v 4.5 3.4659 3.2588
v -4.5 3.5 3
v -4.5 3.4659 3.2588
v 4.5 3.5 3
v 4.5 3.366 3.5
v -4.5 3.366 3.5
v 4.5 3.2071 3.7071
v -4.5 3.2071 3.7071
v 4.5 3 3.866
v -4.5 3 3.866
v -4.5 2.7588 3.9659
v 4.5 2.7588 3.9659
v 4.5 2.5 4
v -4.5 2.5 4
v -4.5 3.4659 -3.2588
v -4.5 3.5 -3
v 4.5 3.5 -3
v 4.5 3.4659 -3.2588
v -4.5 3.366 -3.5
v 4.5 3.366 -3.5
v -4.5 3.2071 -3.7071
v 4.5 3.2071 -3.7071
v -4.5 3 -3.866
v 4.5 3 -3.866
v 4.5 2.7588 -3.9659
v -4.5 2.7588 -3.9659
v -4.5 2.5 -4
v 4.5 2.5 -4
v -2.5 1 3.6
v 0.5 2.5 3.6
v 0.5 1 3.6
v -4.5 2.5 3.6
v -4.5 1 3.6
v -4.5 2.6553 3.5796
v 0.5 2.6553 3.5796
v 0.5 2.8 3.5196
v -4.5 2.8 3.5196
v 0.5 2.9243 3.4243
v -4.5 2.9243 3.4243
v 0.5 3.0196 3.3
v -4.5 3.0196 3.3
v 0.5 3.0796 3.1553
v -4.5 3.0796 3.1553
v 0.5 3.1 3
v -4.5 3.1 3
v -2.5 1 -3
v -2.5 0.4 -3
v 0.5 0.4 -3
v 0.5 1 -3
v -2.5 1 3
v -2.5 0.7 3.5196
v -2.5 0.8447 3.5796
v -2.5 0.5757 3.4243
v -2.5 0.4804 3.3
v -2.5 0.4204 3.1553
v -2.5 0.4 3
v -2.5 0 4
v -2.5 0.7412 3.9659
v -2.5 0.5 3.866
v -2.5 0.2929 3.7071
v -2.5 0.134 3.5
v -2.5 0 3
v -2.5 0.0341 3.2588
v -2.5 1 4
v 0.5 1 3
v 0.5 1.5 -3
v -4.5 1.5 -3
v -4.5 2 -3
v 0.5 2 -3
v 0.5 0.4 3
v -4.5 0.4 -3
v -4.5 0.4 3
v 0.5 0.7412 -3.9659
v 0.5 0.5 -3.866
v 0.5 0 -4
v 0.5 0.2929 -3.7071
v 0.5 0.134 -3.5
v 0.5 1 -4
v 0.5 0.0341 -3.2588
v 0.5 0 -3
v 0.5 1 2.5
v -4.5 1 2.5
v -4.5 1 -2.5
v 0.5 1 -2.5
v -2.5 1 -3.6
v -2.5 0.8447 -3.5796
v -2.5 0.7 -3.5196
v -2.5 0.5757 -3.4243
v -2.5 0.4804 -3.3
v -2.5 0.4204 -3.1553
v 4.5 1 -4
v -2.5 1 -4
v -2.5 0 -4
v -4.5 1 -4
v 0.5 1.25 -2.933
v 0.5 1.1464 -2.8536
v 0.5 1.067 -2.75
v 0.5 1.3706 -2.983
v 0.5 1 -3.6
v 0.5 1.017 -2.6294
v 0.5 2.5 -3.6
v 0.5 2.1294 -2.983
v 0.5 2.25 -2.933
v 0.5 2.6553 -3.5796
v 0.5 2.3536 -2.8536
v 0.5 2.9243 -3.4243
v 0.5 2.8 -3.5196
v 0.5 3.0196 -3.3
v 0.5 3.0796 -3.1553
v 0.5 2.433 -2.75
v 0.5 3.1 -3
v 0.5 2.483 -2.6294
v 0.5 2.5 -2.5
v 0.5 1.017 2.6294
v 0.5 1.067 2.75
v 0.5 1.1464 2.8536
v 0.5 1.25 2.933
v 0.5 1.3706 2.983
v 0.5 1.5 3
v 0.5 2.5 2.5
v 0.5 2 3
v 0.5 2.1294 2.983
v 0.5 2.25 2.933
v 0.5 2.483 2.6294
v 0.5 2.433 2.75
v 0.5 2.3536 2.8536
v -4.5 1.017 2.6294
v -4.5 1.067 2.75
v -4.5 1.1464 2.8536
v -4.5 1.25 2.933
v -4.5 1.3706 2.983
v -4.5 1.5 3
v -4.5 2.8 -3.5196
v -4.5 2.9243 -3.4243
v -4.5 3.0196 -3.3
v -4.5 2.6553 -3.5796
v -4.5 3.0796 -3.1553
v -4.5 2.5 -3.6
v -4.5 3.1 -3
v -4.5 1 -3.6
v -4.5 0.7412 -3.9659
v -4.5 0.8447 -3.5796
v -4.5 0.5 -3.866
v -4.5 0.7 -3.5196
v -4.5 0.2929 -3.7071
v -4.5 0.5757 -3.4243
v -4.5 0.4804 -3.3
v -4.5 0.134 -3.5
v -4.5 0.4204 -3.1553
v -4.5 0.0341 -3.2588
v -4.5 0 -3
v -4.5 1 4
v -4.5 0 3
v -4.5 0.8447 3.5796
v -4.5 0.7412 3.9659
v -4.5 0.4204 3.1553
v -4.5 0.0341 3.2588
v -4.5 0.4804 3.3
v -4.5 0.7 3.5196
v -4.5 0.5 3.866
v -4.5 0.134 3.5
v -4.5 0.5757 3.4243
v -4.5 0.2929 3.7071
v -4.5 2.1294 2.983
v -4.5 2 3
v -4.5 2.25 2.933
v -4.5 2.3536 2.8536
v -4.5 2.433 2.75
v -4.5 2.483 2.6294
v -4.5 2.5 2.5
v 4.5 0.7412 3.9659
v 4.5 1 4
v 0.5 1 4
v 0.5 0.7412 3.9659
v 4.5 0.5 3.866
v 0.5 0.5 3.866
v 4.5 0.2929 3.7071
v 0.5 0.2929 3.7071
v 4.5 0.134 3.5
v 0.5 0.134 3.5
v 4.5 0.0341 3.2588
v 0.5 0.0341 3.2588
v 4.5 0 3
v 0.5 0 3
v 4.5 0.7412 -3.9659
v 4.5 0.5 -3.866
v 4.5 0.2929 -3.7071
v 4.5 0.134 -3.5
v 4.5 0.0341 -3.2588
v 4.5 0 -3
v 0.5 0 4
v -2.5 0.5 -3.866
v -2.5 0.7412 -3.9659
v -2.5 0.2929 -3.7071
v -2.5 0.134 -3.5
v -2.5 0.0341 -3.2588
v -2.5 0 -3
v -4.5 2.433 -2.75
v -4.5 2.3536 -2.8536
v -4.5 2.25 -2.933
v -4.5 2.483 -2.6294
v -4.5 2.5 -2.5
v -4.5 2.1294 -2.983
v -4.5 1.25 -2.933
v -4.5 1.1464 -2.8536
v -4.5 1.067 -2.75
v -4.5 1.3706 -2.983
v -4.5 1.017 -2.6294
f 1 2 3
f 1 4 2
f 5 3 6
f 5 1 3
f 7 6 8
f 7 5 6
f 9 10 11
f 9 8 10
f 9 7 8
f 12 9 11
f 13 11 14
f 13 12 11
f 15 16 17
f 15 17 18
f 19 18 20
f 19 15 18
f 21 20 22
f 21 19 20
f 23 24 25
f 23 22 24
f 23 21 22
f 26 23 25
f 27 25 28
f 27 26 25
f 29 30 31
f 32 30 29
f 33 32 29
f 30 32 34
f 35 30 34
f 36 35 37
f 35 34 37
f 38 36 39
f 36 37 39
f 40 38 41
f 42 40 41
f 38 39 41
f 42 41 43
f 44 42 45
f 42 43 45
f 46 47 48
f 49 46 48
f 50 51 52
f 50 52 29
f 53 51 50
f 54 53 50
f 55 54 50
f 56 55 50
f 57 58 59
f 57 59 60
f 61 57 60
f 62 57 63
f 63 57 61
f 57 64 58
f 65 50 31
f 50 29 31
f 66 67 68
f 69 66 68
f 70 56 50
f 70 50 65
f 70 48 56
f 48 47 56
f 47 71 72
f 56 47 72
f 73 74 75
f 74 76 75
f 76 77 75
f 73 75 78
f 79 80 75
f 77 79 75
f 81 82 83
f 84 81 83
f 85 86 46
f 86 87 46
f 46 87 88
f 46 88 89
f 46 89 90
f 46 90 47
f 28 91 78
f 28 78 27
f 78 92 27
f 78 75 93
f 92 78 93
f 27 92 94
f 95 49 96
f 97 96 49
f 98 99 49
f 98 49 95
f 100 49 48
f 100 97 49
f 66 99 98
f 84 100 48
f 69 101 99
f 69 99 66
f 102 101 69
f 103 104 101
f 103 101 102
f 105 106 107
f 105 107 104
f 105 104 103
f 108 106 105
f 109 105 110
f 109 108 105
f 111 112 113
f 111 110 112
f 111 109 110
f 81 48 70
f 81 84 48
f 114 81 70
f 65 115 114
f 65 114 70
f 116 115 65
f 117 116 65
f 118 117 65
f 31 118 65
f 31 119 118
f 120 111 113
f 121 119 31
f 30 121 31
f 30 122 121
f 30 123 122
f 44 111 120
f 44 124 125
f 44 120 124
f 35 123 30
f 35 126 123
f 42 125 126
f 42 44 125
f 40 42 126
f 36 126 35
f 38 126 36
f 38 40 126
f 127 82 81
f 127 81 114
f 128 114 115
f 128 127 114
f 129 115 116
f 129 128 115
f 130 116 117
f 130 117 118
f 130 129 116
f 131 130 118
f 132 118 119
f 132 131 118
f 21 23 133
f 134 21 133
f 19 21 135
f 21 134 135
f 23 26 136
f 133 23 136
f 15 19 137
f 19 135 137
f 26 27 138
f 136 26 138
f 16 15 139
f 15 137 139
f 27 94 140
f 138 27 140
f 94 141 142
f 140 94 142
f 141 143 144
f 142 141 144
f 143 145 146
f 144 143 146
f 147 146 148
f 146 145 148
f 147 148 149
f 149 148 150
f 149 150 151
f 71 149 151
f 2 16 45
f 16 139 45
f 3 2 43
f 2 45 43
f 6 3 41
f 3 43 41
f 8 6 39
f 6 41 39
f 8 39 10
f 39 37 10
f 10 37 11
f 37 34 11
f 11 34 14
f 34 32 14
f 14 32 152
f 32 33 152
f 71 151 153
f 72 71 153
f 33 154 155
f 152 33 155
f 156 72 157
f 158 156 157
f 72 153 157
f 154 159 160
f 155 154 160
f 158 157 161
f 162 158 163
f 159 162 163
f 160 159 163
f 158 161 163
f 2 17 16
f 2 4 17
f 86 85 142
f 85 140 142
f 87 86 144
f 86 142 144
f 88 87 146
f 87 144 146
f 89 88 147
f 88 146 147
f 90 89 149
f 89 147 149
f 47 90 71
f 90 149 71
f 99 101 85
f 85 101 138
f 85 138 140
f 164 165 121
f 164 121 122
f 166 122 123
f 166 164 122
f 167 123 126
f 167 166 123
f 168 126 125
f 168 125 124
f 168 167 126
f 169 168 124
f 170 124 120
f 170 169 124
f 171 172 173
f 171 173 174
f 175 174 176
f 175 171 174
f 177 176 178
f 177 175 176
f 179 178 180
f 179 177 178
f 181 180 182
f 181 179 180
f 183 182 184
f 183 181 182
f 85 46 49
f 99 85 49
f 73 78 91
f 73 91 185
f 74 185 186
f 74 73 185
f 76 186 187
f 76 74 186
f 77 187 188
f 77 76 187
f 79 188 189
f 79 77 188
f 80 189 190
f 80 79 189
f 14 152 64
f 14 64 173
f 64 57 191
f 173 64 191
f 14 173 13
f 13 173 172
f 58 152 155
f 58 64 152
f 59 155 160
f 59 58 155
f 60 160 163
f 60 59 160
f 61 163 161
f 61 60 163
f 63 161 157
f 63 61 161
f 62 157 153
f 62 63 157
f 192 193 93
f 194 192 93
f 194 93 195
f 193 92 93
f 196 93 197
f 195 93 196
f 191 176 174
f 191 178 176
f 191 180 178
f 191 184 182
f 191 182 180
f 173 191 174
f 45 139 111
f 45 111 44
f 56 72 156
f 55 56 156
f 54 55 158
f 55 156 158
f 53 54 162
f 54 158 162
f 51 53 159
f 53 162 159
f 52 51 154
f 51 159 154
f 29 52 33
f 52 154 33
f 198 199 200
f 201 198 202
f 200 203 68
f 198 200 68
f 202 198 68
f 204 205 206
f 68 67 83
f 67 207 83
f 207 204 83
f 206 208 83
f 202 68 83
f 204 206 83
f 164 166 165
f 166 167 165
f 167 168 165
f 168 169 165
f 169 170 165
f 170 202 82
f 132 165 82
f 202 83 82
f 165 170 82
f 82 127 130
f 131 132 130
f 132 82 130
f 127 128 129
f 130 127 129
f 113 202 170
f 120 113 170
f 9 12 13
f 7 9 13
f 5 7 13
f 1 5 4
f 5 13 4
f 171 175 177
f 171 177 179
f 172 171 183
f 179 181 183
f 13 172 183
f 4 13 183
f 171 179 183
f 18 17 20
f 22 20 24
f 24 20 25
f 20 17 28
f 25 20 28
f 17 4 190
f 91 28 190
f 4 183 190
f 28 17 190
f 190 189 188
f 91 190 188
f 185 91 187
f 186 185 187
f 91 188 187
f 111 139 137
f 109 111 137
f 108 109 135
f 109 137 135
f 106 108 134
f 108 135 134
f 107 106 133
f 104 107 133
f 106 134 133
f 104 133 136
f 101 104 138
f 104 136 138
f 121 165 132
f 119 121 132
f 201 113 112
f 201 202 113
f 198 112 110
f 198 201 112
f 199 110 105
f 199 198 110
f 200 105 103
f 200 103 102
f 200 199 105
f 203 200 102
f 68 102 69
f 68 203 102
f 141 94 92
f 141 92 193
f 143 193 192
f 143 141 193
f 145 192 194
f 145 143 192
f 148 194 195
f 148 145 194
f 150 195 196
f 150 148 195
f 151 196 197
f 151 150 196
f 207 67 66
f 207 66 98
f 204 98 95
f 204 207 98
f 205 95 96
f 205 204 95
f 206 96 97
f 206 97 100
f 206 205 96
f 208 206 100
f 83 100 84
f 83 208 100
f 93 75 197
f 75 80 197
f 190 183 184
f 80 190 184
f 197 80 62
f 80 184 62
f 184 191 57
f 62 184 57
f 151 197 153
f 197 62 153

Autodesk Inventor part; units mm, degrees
ref_plane "YZ Plane" through (0, 0, 0) normal (1, 0, 0) x (0, 1, 0)
ref_plane "XZ Plane" through (0, 0, 0) normal (0, 1, 0) x (-1, 0, 0)
ref_plane "XY Plane" through (0, 0, 0) normal (0, 0, 1) x (1, 0, 0)
sketch "Skizze1" plane through (0, 0, 0) normal (0, 1, 0) x (-1, 0, 0)
  line L0 (4.5, 4) -> (-4.5, 4)
  line L1 (-4.5, 4) -> (-4.5, -4)
  line L2 (-4.5, -4) -> (4.5, -4)
  line L3 (4.5, -4) -> (4.5, 4)
  line L4 (4.5, 4) -> (-4.5, -4) construction
  line L5 (-4.5, 4) -> (4.5, -4) construction
  point P0 (0, 0)
  dimension "d0" = 9
  dimension "d1" = 8
extrude "Extrusion1" add sketch "Skizze1" along normal blind 3.5
fillet "Rundung1" radius 1 4 edges at (0, 3.5, 4) (0, 0, 4) (0, 3.5, -4) (0, 0, -4)
sketch "Skizze2" plane through (-4.5, 0, -3) normal (-1, 0, 0) x (0, 0, 1)
  line L0 (-1, 1) -> (-1, 2.5) projected
  arc A0 (0, 3.5) -> (-1, 2.5) centre (0, 2.5) ccw projected
  line L1 (0, 3.5) -> (6, 3.5) projected
  arc A1 (7, 2.5) -> (6, 3.5) centre (6, 2.5) ccw projected
  line L2 (7, 1) -> (7, 2.5) projected
  arc A2 (6, 0) -> (7, 1) centre (6, 1) ccw projected
  line L3 (0, 0) -> (6, 0) projected
  arc A3 (-1, 1) -> (0, 0) centre (0, 1) ccw projected
  line L4 (0.5, 2.5) -> (5.5, 2.5)
  line L5 (6, 2) -> (6, 1.5)
  line L6 (5.5, 1) -> (0.5, 1)
  line L7 (0, 1.5) -> (0, 2)
  arc A4 (0.5, 2.5) -> (0, 2) centre (0.5, 2) ccw
  arc A5 (0, 1.5) -> (0.5, 1) centre (0.5, 1.5) ccw
  arc A6 (5.5, 1) -> (6, 1.5) centre (5.5, 1.5) ccw
  arc A7 (6, 2) -> (5.5, 2.5) centre (5.5, 2) ccw
  line L8 (0, 3.1) -> (6, 3.1)
  line L9 (0, 0.4) -> (6, 0.4)
  line L10 (-0.6, 2.5) -> (-0.6, 1)
  line L11 (6.6, 2.5) -> (6.6, 1)
  arc A8 (0, 3.1) -> (-0.6, 2.5) centre (0, 2.5) ccw
  arc A9 (6.6, 2.5) -> (6, 3.1) centre (6, 2.5) ccw
  arc A10 (6, 0.4) -> (6.6, 1) centre (6, 1) ccw
  arc A11 (-0.6, 1) -> (0, 0.4) centre (0, 1) ccw
  point P0 (3, 0)
  dimension "d5" = 0.5
  dimension "d6" = 0.4
  dimension "d7" = 0.4
  dimension "d8" = 0.4
  dimension "d9" = 0.4
extrude "Extrusion2" cut sketch "Skizze2" against normal blind 5 contours L8 A9 L11 A10 L9 A11 L10 A8
sketch "Skizze3" plane through (0, 0, 0) normal (0, -1, 0) x (1, 0, 0)
  line L0 (-4.5, 3) -> (4.5, 3) projected
  line L1 (4.5, 4) -> (-4.5, 4) projected
  line L2 (-2.5, 3) -> (0.5, 3)
  line L3 (0.5, 3) -> (0.5, 4)
  line L4 (0.5, 4) -> (-2.5, 4)
  line L5 (-2.5, 4) -> (-2.5, 3)
  line L6 (-4.5, 3) -> (-4.5, 4) projected
  line L7 (-2.8823, 0) -> (1.7829, 0)
  line L8 (-4.5, -3) -> (4.5, -3)
  line L9 (4.5, -4) -> (-4.5, -4)
  line L10 (0.5, -3) -> (0.5, -4)
  line L11 (-2.5, -4) -> (-2.5, -3)
  point P0 (0, 0)
  dimension "d12" = 2
  dimension "d13" = 3
extrude "Extrusion3" add sketch "Skizze3" against normal blind 1 contours L5 L1 L3 L0 | L8 L10 L9 L11
properties part number "USB-C"
